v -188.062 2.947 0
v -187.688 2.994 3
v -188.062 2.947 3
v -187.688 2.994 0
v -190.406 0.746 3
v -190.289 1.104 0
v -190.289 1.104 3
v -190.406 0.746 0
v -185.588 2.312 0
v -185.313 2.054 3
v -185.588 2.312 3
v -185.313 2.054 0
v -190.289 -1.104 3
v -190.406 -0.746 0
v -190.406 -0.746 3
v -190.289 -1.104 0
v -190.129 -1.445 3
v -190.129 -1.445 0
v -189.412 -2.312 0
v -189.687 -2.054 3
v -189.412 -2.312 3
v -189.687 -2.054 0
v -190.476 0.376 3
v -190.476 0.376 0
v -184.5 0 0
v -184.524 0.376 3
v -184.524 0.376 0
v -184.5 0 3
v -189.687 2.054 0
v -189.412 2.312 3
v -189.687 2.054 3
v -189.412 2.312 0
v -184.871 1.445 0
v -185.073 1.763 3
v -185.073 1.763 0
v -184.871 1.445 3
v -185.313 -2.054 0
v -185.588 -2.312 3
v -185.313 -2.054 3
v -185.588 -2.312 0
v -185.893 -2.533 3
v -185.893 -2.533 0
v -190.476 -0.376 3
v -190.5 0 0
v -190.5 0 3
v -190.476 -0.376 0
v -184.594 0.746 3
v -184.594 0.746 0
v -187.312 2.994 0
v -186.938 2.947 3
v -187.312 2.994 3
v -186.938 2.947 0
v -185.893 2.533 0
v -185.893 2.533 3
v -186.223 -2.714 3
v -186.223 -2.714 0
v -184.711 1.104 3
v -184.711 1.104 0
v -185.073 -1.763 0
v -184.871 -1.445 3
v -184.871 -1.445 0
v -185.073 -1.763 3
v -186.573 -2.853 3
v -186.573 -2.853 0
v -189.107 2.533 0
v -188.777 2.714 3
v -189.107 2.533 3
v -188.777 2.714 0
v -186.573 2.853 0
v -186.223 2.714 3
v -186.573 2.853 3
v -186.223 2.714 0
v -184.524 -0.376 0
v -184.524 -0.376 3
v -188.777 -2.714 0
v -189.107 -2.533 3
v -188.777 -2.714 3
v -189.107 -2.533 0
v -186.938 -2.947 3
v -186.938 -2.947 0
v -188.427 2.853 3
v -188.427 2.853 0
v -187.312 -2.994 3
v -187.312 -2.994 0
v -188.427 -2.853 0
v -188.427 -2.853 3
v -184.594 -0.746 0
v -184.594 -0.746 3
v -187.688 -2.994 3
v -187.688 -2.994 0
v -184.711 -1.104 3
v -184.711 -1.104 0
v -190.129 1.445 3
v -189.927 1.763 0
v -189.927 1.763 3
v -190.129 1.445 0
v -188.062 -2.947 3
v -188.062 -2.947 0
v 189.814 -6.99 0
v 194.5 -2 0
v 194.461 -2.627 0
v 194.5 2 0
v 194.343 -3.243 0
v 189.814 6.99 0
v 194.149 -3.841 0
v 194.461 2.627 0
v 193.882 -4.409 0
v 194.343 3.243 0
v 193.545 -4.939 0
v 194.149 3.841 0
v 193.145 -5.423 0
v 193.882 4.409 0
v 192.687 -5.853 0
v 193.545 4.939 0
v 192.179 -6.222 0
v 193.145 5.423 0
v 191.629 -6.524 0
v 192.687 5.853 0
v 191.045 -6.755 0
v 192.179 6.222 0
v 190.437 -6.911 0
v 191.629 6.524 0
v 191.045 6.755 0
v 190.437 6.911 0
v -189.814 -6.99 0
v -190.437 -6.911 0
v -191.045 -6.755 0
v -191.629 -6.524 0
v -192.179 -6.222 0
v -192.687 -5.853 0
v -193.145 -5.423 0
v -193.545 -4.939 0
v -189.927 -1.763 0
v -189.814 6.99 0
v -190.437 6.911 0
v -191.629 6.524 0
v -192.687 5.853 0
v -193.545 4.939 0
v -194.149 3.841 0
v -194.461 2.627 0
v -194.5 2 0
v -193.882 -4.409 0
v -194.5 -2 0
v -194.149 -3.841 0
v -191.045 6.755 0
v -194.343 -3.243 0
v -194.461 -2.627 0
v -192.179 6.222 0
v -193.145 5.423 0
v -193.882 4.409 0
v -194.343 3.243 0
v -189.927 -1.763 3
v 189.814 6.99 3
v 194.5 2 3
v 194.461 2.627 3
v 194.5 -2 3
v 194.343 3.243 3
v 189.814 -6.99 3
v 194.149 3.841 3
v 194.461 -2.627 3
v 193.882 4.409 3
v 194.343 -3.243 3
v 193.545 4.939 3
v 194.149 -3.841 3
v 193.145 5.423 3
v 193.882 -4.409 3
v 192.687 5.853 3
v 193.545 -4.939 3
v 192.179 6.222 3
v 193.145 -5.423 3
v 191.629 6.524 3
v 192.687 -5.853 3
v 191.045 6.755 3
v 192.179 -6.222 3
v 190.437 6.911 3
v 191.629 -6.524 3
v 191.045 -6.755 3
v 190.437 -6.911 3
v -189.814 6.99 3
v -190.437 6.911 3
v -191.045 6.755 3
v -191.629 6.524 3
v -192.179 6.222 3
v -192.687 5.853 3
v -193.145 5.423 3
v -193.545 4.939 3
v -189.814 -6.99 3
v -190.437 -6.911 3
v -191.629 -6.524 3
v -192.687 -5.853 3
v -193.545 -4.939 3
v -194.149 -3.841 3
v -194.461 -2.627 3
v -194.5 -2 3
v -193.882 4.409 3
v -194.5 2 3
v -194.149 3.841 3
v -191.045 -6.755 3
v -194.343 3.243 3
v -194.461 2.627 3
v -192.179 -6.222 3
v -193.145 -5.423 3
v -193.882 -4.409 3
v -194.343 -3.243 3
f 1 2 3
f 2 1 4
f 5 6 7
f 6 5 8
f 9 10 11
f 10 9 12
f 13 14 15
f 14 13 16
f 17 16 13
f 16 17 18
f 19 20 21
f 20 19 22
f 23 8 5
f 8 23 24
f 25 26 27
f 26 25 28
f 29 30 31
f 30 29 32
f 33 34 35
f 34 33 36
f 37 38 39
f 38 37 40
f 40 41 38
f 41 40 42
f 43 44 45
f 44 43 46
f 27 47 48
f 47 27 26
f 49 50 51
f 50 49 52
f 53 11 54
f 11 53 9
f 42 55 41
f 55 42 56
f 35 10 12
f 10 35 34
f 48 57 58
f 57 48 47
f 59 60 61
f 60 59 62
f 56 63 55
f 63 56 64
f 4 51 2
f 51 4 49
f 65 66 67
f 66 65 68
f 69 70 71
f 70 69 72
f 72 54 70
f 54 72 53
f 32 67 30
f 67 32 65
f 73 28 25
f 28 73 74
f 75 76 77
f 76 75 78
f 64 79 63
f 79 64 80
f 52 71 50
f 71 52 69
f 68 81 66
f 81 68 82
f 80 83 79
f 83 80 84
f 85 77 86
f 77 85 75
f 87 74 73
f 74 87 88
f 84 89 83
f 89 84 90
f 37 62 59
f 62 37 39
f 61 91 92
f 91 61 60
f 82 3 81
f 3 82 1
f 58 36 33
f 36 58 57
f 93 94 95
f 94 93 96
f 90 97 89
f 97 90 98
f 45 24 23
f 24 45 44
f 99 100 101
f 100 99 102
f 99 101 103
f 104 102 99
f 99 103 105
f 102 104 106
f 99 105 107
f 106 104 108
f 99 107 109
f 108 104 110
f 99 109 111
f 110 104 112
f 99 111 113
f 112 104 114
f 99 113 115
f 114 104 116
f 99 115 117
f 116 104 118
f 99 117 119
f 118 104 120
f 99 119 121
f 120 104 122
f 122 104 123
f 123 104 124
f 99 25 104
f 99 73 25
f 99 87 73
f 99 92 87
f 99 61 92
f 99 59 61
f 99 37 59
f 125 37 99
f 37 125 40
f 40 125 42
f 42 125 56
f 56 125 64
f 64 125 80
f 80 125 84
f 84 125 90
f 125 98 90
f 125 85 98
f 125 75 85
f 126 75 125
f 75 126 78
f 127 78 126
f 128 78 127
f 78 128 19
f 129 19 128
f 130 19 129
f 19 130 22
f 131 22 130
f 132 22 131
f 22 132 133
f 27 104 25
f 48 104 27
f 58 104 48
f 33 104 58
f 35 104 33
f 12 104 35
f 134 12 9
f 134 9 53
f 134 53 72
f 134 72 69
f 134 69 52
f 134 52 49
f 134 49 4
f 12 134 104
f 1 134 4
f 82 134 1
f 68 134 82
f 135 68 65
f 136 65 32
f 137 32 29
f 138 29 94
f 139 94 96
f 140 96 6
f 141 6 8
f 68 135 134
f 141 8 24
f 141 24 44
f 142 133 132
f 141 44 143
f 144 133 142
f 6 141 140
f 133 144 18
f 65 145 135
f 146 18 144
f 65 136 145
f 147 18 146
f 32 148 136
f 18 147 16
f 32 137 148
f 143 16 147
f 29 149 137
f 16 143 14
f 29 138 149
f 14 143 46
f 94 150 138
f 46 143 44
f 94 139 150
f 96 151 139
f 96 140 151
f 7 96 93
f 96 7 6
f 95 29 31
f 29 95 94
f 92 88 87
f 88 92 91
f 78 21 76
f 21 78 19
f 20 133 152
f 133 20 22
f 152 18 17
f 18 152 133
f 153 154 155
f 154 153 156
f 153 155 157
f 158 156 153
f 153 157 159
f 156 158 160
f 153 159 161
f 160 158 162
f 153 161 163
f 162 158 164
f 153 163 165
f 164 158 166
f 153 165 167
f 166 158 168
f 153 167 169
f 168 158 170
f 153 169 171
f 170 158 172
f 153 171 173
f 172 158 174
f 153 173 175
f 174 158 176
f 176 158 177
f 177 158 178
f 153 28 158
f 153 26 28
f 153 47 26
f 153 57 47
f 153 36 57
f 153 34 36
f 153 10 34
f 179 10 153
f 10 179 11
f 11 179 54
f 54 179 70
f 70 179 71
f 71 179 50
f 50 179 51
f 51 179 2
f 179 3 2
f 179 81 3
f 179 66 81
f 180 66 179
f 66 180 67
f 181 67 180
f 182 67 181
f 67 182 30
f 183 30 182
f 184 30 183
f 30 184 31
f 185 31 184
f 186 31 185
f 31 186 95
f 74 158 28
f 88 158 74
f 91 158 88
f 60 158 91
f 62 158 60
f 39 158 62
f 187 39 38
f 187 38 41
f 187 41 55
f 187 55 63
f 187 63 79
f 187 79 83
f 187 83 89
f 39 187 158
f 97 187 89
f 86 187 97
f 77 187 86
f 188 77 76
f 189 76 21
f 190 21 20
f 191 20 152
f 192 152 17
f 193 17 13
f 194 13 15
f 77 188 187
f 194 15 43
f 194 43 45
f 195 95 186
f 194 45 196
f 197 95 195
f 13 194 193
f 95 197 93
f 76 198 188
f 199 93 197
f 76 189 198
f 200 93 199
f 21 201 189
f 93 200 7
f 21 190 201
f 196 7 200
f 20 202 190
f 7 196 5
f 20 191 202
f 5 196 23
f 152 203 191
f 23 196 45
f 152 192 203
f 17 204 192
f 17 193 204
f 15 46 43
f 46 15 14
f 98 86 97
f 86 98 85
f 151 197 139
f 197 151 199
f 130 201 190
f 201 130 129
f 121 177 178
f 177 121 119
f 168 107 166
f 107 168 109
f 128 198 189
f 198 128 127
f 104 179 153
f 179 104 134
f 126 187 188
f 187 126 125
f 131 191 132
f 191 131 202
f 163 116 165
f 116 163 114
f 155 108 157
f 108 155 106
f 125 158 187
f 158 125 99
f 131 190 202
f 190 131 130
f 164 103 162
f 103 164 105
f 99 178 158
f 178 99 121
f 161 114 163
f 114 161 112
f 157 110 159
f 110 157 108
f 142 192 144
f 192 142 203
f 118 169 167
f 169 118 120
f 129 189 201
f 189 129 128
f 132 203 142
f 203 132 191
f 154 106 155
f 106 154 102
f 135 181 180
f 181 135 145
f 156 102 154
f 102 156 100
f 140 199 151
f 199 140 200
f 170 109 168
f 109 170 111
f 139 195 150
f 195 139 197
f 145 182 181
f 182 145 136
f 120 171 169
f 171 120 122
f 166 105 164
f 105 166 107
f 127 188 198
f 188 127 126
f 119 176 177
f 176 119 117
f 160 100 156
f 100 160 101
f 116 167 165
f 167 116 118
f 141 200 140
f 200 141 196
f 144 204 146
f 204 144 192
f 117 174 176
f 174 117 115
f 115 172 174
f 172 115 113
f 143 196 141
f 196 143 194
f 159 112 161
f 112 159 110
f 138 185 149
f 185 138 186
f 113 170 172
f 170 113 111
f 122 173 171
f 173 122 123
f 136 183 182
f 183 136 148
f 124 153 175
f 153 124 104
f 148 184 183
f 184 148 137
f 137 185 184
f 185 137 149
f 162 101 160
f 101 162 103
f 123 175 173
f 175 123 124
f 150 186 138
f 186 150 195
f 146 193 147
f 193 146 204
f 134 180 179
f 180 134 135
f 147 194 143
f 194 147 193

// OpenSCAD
$fn = 50;


difference() {
	union() {
		hull() {
			translate(v = [-189.5000000000, 2.0000000000, 0]) {
				cylinder(h = 3, r = 5);
			}
			translate(v = [189.5000000000, 2.0000000000, 0]) {
				cylinder(h = 3, r = 5);
			}
			translate(v = [-189.5000000000, -2.0000000000, 0]) {
				cylinder(h = 3, r = 5);
			}
			translate(v = [189.5000000000, -2.0000000000, 0]) {
				cylinder(h = 3, r = 5);
			}
		}
	}
	union() {
		translate(v = [-187.5000000000, 0.0000000000, 0]) {
			cylinder(h = 3, r = 3.0000000000);
		}
		translate(v = [-187.5000000000, 0.0000000000, 0]) {
			cylinder(h = 3, r = 1.5000000000);
		}
		translate(v = [-187.5000000000, 0.0000000000, 0]) {
			cylinder(h = 3, r = 1.5000000000);
		}
		translate(v = [-187.5000000000, 0.0000000000, 0]) {
			cylinder(h = 3, r = 1.5000000000);
		}
	}
}
